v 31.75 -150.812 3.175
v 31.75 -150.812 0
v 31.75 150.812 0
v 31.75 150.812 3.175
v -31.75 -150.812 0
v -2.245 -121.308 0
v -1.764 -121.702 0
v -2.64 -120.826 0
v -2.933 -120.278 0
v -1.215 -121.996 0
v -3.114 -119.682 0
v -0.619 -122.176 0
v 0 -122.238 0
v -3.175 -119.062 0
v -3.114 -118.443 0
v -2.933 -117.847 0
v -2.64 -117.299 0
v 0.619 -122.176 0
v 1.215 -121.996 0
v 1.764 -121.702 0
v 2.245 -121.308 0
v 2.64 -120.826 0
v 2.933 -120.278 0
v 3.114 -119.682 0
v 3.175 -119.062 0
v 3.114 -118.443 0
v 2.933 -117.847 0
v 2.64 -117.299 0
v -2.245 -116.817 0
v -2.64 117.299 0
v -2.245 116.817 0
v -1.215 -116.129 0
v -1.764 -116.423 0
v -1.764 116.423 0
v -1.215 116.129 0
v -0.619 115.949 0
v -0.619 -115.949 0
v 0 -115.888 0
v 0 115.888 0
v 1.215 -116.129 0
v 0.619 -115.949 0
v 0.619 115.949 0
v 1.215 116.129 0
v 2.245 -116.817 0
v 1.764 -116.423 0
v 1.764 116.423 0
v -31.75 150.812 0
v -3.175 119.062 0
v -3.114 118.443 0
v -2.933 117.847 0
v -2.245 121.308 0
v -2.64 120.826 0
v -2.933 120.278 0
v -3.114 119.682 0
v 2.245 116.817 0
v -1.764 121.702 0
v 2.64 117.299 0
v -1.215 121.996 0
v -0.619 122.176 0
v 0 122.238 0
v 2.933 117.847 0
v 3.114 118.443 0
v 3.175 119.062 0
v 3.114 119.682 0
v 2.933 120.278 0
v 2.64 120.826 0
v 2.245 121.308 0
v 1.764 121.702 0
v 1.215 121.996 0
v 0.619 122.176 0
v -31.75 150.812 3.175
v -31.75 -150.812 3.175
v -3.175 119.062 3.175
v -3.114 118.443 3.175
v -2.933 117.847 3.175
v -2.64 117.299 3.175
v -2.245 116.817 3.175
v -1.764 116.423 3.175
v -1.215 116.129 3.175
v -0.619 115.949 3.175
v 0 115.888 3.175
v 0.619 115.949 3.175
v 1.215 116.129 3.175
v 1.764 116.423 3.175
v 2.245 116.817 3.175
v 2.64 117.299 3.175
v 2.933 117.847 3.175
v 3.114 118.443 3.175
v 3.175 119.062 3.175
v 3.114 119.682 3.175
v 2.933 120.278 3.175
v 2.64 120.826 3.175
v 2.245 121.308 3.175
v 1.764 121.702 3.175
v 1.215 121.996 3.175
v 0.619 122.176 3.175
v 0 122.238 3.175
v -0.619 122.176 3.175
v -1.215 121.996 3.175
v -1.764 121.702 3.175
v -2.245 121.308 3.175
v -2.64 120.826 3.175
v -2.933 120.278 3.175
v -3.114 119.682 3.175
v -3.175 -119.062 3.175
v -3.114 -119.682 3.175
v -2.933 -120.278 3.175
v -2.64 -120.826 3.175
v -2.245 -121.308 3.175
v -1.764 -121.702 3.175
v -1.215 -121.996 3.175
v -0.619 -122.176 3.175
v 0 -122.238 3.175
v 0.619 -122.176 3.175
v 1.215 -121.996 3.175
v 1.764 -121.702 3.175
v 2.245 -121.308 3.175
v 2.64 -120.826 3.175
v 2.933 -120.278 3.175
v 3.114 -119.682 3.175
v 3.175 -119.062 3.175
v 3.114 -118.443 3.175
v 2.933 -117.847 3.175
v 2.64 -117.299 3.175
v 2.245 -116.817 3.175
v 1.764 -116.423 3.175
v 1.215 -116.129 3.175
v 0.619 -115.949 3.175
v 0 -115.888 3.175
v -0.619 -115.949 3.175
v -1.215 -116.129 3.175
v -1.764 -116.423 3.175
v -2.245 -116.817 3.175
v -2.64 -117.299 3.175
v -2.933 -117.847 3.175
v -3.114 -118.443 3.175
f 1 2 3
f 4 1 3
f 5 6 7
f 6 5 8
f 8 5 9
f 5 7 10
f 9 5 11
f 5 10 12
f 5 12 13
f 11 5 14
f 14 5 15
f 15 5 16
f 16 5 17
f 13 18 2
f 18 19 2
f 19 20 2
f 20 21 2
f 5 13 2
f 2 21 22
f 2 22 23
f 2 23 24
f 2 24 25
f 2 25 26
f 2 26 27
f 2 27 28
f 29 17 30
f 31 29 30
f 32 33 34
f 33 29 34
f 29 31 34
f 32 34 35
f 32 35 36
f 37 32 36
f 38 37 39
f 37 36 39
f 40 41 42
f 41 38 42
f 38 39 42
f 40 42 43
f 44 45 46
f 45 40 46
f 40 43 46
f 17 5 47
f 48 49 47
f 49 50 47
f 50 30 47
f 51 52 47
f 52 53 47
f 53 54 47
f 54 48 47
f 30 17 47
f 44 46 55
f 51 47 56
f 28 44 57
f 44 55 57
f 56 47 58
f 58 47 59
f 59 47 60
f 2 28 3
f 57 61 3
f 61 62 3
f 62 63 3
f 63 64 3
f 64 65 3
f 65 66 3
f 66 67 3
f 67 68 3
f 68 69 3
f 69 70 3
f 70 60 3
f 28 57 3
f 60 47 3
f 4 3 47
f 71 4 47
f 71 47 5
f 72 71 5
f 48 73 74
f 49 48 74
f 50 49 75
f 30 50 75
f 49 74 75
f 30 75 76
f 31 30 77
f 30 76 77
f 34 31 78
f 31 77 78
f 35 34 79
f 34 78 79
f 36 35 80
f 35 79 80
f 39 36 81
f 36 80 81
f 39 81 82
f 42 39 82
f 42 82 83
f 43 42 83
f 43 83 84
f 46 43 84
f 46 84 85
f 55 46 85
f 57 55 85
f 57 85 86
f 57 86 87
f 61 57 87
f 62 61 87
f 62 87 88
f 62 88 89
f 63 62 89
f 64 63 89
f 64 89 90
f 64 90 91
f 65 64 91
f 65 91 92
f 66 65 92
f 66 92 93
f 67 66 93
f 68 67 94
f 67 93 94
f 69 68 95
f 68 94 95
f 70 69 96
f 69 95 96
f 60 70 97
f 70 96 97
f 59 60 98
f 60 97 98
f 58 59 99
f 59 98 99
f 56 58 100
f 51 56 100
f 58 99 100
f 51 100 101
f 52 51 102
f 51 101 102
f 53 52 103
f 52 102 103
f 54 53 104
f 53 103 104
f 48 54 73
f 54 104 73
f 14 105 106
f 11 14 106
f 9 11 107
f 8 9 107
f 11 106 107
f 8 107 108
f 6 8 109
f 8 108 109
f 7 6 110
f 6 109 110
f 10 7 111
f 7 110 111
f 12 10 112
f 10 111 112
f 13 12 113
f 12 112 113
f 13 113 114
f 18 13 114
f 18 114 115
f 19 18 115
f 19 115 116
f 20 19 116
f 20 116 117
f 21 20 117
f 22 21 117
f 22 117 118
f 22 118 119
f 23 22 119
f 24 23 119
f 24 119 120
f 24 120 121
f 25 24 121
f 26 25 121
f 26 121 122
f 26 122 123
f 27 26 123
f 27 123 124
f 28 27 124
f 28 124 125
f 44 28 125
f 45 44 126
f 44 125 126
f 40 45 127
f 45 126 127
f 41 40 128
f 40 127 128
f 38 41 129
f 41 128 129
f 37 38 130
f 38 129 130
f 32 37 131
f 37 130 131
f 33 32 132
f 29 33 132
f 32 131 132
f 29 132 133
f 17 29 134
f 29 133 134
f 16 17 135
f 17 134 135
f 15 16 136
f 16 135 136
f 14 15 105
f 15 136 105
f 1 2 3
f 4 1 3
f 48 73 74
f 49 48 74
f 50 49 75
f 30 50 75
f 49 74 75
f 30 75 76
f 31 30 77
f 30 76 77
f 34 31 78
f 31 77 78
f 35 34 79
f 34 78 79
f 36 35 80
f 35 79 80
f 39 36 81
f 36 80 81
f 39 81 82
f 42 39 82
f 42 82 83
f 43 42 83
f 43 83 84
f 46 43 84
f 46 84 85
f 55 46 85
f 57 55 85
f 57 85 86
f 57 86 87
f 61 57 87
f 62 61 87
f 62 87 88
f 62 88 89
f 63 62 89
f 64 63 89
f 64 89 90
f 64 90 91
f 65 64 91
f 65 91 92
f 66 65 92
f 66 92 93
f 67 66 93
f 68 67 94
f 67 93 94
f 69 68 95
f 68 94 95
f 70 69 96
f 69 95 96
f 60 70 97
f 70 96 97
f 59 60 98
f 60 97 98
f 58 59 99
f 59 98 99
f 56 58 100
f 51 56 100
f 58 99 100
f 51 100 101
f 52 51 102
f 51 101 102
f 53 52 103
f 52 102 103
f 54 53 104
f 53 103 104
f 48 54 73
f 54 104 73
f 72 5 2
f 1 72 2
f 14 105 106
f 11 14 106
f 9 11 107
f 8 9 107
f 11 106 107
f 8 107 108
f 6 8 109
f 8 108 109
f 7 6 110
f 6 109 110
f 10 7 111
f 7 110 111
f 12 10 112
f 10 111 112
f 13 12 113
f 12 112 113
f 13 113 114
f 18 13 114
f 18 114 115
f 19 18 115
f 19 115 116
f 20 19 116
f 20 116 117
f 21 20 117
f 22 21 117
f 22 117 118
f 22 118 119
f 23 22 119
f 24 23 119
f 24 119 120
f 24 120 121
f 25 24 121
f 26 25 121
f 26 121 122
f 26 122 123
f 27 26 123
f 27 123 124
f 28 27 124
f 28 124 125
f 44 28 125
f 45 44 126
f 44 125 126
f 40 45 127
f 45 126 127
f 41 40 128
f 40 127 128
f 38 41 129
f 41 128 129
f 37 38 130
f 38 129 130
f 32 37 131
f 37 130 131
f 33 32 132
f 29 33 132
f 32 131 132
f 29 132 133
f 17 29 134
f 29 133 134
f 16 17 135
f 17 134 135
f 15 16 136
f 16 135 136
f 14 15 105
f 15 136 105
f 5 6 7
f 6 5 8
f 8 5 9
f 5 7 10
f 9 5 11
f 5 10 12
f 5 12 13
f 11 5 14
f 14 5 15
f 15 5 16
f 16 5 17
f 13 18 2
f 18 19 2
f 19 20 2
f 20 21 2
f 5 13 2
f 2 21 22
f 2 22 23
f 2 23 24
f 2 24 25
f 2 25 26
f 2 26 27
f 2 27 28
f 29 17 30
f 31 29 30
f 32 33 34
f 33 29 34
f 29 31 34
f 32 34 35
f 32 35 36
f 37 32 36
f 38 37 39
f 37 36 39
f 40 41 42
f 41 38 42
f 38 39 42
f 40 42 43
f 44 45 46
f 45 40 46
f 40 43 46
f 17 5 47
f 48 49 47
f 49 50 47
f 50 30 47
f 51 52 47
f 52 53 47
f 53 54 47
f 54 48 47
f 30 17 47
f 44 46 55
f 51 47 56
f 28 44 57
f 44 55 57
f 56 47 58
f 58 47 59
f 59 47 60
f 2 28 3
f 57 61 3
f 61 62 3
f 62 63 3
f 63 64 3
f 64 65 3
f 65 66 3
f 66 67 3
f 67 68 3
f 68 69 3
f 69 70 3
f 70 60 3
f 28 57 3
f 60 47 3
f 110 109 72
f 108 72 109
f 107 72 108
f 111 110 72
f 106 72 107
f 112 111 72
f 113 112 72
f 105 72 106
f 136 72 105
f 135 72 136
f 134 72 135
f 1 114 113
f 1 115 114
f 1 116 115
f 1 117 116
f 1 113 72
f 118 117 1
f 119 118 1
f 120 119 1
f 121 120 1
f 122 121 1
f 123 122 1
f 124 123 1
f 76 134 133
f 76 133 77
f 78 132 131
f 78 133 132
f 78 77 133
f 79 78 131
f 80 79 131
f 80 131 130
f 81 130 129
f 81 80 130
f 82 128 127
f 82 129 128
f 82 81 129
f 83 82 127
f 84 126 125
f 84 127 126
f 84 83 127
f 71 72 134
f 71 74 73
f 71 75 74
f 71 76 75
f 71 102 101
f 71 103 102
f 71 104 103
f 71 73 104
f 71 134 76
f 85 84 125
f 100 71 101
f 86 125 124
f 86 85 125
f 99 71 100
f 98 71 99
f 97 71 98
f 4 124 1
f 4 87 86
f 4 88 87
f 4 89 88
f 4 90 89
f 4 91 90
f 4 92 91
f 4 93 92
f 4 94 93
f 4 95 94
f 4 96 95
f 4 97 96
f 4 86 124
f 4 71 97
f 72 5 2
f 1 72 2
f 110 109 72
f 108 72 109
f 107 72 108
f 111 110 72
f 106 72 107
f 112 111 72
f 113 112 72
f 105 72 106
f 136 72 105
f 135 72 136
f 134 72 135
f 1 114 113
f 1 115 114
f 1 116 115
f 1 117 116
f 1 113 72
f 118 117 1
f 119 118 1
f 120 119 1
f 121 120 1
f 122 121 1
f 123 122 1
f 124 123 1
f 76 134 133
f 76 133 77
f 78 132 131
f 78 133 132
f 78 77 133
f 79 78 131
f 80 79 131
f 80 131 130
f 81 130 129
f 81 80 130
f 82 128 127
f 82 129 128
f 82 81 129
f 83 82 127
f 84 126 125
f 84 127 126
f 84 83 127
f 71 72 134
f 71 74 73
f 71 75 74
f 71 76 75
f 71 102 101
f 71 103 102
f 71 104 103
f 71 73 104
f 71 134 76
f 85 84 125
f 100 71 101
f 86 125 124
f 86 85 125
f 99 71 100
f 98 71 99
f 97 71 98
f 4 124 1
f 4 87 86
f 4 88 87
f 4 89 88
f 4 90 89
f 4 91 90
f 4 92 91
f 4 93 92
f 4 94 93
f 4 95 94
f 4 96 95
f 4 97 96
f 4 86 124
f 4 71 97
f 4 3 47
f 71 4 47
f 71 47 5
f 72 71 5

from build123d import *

# Parameters (mm, degrees)
F0_W     = 31.75
F0_H     = 31.75
F1_DEPTH = 3.175
F2_DEPTH = 3.175
F3_D     = 6.35
F3_2_D   = 6.35


# Not quite as in the source:
# - a feature names something its author has since deleted; it is built from what else it names


with BuildPart() as f1:
    # F0 (on Top) → F1 (new body)
    with BuildSketch(Plane.XY):
        Polygon((31.75, -119.0625), (31.75, 150.8125), (0, 150.8125), (0, 119.0625), (0, -119.0625), align=None)
        Polygon((0, 119.0625), (0, 150.8125), (-31.75, 150.8125), (-31.75, -119.0625), (0, -119.0625), align=None)
        with Locations((15.875, -134.9375)):
            Rectangle(F0_W, F0_H)
        with Locations((-15.875, -134.9375)):
            Rectangle(F0_W, F0_H)
    extrude(amount=F1_DEPTH)

    # F3 (through all)
    with Locations(Plane(origin=(0, 0, 0), x_dir=(1, 0, 0), z_dir=(0, 0, -1))):
        with Locations((0, 119.0625), (0, -119.0625)):
            Hole(F3_D / 2)


with BuildPart() as f2:
    # F0 (on Top) → F2 (new body)
    with BuildSketch(Plane.XY):
        Polygon((31.75, -119.0625), (31.75, 150.8125), (0, 150.8125), (0, 119.0625), (0, -119.0625), align=None)
        Polygon((0, 119.0625), (0, 150.8125), (-31.75, 150.8125), (-31.75, -119.0625), (0, -119.0625), align=None)
        with Locations((15.875, -134.9375)):
            Rectangle(F0_W, F0_H)
        with Locations((-15.875, -134.9375)):
            Rectangle(F0_W, F0_H)
    extrude(amount=F2_DEPTH)

    # F3#2 (through all)
    with Locations(Plane(origin=(0, 0, 0), x_dir=(1, 0, 0), z_dir=(0, 0, -1))):
        with Locations((0, 119.0625), (0, -119.0625)):
            Hole(F3_2_D / 2)


solid = Compound([f1.part, f2.part])
